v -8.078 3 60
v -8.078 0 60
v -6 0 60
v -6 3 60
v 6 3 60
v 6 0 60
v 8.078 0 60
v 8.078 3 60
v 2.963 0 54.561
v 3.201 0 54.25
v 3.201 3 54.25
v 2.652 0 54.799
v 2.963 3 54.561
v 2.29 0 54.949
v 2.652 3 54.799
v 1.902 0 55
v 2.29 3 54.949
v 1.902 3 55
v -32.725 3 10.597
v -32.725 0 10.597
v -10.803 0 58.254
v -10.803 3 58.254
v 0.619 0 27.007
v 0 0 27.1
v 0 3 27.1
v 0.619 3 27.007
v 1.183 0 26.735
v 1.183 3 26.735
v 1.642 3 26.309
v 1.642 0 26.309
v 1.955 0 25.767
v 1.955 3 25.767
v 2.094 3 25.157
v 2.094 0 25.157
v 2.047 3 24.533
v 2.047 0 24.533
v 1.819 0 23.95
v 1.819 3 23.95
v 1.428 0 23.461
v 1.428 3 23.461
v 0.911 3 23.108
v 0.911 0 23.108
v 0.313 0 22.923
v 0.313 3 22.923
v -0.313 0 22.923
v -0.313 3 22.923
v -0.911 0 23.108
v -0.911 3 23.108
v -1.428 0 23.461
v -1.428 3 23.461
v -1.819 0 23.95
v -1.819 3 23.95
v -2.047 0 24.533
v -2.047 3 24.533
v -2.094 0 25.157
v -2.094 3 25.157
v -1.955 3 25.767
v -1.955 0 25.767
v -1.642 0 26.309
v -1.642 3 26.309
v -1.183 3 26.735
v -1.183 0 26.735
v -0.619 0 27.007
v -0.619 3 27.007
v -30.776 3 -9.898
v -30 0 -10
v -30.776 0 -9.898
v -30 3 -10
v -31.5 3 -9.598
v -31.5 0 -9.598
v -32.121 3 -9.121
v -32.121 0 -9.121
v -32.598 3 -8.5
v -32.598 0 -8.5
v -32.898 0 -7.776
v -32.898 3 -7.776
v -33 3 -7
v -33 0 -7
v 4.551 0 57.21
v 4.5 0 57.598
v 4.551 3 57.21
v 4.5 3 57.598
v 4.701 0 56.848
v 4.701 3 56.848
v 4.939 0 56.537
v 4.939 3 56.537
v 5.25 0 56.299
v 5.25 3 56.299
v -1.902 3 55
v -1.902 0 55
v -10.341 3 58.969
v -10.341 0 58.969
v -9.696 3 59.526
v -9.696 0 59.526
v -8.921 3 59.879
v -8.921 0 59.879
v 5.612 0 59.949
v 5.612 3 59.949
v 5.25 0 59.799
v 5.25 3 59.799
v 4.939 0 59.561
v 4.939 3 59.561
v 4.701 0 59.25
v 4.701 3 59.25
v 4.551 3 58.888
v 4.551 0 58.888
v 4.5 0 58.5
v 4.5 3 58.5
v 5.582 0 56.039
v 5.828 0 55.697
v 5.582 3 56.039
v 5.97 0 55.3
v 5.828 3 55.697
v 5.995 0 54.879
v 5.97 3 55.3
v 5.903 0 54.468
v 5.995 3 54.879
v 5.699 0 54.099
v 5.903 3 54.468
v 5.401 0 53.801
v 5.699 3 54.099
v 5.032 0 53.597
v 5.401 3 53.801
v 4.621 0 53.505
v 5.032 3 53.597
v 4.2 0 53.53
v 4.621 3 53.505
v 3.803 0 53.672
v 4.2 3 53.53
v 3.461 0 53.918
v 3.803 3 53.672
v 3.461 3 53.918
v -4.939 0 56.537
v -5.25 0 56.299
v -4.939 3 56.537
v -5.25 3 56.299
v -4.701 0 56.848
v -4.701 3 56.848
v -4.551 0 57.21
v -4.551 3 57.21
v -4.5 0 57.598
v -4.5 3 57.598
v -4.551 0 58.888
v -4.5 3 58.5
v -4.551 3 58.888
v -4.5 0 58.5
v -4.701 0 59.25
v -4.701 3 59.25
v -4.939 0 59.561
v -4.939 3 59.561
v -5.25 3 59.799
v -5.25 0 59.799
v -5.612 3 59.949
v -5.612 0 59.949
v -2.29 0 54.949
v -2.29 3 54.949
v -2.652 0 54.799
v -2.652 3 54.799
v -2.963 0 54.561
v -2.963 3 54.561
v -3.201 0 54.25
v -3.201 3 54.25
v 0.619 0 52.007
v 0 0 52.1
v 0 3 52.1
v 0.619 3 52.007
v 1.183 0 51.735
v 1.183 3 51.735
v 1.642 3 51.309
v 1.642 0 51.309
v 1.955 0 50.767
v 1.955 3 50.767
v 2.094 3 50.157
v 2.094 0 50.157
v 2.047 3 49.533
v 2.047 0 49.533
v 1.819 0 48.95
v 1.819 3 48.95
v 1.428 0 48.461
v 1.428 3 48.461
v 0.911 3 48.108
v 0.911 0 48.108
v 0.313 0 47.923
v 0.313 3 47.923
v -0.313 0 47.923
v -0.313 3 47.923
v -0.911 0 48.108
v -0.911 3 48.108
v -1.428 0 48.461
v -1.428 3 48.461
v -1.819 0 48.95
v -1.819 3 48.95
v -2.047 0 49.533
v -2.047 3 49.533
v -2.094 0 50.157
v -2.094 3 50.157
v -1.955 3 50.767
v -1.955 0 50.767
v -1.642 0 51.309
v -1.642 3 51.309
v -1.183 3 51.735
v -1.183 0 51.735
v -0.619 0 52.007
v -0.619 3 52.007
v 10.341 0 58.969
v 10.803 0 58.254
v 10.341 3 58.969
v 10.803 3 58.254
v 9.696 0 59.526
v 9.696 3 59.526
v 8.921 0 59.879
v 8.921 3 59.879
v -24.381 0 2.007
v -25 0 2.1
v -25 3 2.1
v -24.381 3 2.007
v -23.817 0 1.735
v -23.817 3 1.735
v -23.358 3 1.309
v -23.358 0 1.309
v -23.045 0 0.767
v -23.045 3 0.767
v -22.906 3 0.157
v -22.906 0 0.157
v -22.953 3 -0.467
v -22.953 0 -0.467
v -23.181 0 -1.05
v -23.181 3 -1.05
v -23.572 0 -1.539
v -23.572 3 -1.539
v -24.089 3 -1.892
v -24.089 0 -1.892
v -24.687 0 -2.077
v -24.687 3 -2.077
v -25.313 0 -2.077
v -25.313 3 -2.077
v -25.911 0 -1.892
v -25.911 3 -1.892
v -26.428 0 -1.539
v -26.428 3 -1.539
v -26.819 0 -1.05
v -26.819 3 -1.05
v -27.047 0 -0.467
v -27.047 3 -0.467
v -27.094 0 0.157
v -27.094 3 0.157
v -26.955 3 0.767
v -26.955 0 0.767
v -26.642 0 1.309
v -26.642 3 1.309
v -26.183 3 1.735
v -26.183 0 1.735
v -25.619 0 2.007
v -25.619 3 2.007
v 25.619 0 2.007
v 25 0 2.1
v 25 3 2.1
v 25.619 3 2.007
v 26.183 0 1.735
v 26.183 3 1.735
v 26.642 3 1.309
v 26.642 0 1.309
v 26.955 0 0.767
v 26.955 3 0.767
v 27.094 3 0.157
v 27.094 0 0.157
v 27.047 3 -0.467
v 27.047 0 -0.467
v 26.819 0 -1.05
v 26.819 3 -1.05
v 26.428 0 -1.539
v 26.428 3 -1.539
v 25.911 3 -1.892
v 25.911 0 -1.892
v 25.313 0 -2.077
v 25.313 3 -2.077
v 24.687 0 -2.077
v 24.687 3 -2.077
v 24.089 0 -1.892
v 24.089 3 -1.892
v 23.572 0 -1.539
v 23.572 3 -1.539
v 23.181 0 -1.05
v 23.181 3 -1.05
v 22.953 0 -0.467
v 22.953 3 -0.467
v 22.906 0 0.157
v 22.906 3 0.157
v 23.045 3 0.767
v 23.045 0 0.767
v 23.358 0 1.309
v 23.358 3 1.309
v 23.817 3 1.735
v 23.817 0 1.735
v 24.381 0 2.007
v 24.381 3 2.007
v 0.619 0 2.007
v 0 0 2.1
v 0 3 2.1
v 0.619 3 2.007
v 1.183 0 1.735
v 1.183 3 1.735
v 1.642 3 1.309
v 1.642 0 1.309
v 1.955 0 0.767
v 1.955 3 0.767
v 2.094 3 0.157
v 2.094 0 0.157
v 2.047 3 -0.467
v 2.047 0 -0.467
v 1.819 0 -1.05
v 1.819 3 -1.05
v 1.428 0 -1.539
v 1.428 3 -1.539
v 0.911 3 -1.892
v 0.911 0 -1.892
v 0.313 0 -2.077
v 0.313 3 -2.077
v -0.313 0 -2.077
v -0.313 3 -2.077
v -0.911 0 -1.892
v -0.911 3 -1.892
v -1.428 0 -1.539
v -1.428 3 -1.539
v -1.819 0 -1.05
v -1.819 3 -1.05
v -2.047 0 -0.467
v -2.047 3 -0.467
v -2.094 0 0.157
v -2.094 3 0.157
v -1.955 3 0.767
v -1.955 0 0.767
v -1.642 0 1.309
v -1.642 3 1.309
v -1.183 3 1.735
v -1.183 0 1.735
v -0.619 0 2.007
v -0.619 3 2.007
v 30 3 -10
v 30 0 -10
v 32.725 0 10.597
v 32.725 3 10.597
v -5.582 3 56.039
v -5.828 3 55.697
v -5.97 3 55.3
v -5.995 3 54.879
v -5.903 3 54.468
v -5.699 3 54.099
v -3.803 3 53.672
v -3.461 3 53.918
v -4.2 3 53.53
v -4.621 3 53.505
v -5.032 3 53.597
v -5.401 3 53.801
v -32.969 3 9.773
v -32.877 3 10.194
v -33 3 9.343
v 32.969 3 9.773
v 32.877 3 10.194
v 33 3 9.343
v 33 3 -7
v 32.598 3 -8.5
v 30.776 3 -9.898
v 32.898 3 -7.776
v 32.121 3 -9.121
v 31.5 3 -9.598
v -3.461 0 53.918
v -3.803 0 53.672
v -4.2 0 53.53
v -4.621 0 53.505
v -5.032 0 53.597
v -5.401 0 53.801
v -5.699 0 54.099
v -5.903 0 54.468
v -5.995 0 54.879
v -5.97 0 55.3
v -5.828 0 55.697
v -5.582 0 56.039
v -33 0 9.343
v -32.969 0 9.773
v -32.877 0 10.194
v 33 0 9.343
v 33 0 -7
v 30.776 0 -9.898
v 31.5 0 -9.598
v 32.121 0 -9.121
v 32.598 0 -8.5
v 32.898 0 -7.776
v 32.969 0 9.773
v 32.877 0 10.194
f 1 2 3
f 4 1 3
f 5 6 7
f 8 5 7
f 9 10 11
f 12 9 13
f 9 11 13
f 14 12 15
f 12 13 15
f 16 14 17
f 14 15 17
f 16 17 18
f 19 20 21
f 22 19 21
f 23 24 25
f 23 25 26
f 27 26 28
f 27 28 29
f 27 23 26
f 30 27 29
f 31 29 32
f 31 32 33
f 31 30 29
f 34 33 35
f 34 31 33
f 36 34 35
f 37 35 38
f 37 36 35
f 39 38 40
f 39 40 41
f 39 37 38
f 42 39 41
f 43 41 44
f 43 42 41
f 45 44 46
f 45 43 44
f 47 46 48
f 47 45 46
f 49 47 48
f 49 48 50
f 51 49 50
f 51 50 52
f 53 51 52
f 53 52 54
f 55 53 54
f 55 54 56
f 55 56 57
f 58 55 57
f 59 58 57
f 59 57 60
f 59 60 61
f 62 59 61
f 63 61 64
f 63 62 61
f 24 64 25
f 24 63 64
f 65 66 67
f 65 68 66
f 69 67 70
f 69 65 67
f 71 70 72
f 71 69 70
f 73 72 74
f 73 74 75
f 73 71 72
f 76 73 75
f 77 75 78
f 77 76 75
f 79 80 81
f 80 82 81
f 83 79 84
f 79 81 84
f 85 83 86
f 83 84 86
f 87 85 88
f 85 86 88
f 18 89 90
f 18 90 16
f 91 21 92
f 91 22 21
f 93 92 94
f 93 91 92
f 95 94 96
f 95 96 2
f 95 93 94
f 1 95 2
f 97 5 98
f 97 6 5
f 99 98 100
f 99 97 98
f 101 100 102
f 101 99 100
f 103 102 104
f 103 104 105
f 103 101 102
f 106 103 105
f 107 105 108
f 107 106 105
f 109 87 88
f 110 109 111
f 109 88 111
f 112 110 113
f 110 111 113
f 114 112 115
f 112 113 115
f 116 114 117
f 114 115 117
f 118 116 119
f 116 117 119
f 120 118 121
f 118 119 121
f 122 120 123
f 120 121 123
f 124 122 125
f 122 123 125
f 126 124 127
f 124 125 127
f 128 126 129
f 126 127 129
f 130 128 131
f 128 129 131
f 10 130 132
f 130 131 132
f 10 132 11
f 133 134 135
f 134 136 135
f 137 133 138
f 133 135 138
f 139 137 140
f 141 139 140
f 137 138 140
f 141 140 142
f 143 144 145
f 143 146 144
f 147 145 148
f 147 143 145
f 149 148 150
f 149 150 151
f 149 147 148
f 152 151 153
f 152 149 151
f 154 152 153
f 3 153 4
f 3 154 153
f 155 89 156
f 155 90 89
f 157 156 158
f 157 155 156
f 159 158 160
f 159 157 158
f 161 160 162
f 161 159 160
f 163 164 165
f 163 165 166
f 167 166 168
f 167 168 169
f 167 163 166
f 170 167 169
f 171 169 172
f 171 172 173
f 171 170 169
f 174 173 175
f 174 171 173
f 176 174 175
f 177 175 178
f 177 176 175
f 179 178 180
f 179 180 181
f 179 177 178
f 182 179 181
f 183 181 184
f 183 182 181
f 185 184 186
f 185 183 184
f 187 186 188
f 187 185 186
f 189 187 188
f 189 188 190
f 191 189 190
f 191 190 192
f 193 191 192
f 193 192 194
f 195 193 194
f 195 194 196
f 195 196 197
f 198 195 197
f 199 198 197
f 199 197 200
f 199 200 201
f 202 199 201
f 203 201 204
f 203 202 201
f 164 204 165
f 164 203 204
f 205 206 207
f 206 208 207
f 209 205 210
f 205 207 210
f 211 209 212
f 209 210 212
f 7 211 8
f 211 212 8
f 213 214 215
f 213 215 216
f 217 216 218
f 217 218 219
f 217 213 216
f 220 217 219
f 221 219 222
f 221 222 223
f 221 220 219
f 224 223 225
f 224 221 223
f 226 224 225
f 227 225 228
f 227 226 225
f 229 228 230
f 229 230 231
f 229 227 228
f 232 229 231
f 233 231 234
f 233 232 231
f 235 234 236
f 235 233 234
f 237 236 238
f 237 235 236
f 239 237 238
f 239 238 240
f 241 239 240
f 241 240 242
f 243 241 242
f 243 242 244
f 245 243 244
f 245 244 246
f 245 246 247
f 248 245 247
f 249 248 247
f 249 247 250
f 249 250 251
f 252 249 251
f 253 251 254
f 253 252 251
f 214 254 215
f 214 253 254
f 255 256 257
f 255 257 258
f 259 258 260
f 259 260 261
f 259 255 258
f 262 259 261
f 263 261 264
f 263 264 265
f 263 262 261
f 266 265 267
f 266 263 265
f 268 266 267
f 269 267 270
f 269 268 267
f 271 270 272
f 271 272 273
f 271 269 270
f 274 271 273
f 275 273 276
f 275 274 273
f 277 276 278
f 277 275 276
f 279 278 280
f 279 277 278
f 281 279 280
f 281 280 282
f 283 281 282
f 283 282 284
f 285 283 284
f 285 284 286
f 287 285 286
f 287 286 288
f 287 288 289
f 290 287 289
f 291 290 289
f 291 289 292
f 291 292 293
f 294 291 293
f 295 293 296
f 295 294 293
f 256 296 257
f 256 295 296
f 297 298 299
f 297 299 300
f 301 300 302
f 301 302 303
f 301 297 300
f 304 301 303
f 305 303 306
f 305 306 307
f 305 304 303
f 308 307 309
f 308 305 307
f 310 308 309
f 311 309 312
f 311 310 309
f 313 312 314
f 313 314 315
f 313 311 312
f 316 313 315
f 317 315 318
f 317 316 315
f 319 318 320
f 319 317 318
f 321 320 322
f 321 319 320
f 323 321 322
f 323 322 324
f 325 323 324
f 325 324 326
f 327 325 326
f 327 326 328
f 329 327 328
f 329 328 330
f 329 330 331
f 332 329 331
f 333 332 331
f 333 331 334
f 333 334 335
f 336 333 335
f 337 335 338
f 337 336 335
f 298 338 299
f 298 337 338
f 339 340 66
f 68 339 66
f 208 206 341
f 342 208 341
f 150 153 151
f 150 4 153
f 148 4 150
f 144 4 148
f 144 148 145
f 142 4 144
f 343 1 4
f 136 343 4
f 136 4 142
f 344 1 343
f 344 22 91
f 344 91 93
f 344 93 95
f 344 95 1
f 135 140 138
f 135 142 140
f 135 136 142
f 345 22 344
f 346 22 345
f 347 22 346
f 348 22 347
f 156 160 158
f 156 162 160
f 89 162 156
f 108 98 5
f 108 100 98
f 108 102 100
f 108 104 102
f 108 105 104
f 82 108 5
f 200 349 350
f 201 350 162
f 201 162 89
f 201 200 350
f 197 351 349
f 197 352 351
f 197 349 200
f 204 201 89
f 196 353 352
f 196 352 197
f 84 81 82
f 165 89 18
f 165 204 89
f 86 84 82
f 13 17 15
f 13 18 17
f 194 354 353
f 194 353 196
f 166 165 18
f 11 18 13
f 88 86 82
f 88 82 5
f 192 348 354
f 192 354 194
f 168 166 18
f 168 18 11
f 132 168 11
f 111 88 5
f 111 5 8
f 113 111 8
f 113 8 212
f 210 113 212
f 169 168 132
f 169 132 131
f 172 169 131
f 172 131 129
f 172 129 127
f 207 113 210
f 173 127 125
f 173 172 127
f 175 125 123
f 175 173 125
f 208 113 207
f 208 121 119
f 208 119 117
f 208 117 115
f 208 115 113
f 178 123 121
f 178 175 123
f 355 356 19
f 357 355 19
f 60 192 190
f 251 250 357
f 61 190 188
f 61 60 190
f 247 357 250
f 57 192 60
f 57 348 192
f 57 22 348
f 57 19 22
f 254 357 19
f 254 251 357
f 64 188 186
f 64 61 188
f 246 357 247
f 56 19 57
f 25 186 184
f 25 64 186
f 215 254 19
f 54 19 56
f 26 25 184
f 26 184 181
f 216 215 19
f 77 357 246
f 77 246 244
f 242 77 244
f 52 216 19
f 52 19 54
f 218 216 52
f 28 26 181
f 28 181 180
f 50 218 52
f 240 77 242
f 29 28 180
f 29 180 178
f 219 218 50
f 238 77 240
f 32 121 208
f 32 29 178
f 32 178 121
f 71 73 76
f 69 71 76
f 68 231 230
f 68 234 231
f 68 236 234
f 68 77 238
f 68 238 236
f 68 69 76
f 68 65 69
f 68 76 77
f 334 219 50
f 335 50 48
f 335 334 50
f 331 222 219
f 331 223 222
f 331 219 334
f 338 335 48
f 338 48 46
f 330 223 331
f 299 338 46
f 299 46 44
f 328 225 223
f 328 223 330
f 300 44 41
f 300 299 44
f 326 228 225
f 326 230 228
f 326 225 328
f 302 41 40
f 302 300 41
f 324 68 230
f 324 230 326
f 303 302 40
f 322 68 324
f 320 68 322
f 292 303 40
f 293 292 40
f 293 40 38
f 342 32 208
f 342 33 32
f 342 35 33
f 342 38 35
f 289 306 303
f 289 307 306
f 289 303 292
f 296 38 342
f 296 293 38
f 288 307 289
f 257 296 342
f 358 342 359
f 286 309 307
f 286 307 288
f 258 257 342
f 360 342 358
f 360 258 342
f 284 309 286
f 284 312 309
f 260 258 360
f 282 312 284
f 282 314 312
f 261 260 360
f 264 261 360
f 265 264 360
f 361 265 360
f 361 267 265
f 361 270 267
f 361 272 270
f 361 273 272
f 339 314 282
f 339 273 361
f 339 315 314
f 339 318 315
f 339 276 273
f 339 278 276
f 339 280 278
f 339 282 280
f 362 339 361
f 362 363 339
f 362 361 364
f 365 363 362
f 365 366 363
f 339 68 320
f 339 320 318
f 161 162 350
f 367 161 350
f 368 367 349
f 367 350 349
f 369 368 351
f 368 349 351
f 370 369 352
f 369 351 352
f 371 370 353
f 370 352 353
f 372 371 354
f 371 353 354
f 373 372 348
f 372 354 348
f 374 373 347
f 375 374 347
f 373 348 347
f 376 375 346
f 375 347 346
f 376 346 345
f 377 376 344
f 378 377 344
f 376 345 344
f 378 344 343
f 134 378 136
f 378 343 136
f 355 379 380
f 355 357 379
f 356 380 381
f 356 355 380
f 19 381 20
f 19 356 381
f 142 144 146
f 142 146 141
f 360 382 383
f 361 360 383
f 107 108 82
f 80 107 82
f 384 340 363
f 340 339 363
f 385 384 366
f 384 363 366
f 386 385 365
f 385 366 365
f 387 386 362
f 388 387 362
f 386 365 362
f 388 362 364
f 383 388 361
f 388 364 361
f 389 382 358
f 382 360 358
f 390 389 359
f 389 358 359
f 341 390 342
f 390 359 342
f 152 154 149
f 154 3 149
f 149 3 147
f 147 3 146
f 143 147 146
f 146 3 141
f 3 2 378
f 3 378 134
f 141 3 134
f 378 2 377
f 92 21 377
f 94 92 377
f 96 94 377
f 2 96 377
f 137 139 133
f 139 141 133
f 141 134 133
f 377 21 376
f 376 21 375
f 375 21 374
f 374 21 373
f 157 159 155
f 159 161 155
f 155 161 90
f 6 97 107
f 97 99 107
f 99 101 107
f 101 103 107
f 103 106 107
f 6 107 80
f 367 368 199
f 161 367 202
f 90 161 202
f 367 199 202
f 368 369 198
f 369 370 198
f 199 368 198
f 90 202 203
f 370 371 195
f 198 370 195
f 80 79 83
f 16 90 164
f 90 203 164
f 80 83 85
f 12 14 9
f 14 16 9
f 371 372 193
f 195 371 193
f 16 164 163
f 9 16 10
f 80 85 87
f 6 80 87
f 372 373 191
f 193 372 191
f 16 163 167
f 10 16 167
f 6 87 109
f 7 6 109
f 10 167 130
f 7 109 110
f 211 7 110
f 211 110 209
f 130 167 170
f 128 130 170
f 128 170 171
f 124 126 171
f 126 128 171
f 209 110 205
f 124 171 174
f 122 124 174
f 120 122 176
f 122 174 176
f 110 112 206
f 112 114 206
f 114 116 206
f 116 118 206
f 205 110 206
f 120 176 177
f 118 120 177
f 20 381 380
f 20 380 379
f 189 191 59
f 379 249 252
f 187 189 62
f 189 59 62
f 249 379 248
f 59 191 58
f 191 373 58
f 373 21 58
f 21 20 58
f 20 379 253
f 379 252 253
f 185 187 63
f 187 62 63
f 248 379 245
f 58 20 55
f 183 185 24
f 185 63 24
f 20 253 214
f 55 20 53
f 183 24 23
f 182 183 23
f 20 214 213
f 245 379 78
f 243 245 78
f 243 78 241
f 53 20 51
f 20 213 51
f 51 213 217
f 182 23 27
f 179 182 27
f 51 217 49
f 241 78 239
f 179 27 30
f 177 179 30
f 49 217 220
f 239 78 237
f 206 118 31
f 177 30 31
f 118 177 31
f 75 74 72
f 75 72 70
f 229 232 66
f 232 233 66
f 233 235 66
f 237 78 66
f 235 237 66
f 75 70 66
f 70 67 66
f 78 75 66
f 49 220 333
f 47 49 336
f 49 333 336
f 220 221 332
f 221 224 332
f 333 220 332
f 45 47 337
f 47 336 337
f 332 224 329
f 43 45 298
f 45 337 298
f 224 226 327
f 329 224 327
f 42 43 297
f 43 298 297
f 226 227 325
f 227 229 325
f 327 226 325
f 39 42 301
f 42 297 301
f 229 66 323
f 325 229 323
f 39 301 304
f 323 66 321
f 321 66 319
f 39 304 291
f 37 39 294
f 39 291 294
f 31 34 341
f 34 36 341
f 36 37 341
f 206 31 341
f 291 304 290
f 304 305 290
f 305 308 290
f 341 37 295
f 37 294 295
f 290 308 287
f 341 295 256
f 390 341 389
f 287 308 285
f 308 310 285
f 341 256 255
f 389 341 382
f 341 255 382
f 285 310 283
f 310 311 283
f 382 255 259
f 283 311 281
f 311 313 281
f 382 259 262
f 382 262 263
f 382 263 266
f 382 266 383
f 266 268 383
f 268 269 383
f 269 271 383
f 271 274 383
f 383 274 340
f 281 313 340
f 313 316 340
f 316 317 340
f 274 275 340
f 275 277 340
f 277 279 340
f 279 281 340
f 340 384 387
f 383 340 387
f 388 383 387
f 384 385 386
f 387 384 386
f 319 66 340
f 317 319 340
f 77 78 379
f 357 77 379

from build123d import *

# Parameters (mm, degrees)
SKETCH_1_R          = 2.1
EXTRUDE_1_DEPTH     = 3
FILLET_1_R          = 3
SKETCH_2_W          = 9
SKETCH_2_H          = 5
CUT_EXTRUDE_1_DEPTH = 3
SKETCH_3_R          = 1.5
CUT_EXTRUDE_2_DEPTH = 10
FILLET_2_R          = 1.5


with BuildPart() as part:
    # 草图1 → 凸台-拉伸1 (new body)
    with BuildSketch(Plane(origin=(0, 0, 0), x_dir=(1, 0, 0), z_dir=(0, 1, 0))):
        Polygon((33, 10), (-33, 10), (-33, -10), (-10, -60), (10, -60), (33, -10), align=None)
        with Locations(Location((0, 0, 0), (0, 0, 270))):
            Circle(SKETCH_1_R, mode=Mode.SUBTRACT)
        with Locations(Location((25, 0, 0), (0, 0, 270))):
            Circle(SKETCH_1_R, mode=Mode.SUBTRACT)
        with Locations(Location((-25, 0, 0), (0, 0, 270))):
            Circle(SKETCH_1_R, mode=Mode.SUBTRACT)
        with Locations(Location((0, -25, 0), (0, 0, 270))):
            Circle(SKETCH_1_R, mode=Mode.SUBTRACT)
        with Locations(Location((0, -50, 0), (0, 0, 270))):
            Circle(SKETCH_1_R, mode=Mode.SUBTRACT)
    extrude(amount=EXTRUDE_1_DEPTH)

    # 圆角1
    fillet_1_edges = [part.edges().sort_by_distance(p)[0] for p in [
        (10, 1.5, 60),
        (-10, 1.5, 60),
        (-33, 1.5, 10),
        (-33, 1.5, -10),
        (33, 1.5, -10),
        (33, 1.5, 10),
    ]]
    fillet(fillet_1_edges, radius=FILLET_1_R)

    # 草图2 → 切除-拉伸1 (cut)
    with BuildSketch(Plane(origin=(0, 3, 0), x_dir=(1, 0, 0), z_dir=(0, 1, 0))):
        with Locations((0, -57.5)):
            Rectangle(SKETCH_2_W, SKETCH_2_H)
    extrude(amount=-CUT_EXTRUDE_1_DEPTH, mode=Mode.SUBTRACT)

    # 草图3 → 切除-拉伸2 (cut)
    with BuildSketch(Plane(origin=(0, 3, 0), x_dir=(1, 0, 0), z_dir=(0, 1, 0))):
        with Locations((-4.5, -55)):
            Circle(SKETCH_3_R)
        with Locations((4.5, -55)):
            Circle(SKETCH_3_R)
    extrude(amount=-CUT_EXTRUDE_2_DEPTH, mode=Mode.SUBTRACT)

    # 圆角2
    fillet_2_edges = [part.edges().sort_by_distance(p)[0] for p in [
        (-4.5, 1.5, 56.5),
        (3, 1.5, 55),
        (-4.5, 1.5, 60),
        (4.5, 1.5, 60),
        (4.5, 1.5, 56.5),
        (-3, 1.5, 55),
    ]]
    fillet(fillet_2_edges, radius=FILLET_2_R)


solid = part.part
